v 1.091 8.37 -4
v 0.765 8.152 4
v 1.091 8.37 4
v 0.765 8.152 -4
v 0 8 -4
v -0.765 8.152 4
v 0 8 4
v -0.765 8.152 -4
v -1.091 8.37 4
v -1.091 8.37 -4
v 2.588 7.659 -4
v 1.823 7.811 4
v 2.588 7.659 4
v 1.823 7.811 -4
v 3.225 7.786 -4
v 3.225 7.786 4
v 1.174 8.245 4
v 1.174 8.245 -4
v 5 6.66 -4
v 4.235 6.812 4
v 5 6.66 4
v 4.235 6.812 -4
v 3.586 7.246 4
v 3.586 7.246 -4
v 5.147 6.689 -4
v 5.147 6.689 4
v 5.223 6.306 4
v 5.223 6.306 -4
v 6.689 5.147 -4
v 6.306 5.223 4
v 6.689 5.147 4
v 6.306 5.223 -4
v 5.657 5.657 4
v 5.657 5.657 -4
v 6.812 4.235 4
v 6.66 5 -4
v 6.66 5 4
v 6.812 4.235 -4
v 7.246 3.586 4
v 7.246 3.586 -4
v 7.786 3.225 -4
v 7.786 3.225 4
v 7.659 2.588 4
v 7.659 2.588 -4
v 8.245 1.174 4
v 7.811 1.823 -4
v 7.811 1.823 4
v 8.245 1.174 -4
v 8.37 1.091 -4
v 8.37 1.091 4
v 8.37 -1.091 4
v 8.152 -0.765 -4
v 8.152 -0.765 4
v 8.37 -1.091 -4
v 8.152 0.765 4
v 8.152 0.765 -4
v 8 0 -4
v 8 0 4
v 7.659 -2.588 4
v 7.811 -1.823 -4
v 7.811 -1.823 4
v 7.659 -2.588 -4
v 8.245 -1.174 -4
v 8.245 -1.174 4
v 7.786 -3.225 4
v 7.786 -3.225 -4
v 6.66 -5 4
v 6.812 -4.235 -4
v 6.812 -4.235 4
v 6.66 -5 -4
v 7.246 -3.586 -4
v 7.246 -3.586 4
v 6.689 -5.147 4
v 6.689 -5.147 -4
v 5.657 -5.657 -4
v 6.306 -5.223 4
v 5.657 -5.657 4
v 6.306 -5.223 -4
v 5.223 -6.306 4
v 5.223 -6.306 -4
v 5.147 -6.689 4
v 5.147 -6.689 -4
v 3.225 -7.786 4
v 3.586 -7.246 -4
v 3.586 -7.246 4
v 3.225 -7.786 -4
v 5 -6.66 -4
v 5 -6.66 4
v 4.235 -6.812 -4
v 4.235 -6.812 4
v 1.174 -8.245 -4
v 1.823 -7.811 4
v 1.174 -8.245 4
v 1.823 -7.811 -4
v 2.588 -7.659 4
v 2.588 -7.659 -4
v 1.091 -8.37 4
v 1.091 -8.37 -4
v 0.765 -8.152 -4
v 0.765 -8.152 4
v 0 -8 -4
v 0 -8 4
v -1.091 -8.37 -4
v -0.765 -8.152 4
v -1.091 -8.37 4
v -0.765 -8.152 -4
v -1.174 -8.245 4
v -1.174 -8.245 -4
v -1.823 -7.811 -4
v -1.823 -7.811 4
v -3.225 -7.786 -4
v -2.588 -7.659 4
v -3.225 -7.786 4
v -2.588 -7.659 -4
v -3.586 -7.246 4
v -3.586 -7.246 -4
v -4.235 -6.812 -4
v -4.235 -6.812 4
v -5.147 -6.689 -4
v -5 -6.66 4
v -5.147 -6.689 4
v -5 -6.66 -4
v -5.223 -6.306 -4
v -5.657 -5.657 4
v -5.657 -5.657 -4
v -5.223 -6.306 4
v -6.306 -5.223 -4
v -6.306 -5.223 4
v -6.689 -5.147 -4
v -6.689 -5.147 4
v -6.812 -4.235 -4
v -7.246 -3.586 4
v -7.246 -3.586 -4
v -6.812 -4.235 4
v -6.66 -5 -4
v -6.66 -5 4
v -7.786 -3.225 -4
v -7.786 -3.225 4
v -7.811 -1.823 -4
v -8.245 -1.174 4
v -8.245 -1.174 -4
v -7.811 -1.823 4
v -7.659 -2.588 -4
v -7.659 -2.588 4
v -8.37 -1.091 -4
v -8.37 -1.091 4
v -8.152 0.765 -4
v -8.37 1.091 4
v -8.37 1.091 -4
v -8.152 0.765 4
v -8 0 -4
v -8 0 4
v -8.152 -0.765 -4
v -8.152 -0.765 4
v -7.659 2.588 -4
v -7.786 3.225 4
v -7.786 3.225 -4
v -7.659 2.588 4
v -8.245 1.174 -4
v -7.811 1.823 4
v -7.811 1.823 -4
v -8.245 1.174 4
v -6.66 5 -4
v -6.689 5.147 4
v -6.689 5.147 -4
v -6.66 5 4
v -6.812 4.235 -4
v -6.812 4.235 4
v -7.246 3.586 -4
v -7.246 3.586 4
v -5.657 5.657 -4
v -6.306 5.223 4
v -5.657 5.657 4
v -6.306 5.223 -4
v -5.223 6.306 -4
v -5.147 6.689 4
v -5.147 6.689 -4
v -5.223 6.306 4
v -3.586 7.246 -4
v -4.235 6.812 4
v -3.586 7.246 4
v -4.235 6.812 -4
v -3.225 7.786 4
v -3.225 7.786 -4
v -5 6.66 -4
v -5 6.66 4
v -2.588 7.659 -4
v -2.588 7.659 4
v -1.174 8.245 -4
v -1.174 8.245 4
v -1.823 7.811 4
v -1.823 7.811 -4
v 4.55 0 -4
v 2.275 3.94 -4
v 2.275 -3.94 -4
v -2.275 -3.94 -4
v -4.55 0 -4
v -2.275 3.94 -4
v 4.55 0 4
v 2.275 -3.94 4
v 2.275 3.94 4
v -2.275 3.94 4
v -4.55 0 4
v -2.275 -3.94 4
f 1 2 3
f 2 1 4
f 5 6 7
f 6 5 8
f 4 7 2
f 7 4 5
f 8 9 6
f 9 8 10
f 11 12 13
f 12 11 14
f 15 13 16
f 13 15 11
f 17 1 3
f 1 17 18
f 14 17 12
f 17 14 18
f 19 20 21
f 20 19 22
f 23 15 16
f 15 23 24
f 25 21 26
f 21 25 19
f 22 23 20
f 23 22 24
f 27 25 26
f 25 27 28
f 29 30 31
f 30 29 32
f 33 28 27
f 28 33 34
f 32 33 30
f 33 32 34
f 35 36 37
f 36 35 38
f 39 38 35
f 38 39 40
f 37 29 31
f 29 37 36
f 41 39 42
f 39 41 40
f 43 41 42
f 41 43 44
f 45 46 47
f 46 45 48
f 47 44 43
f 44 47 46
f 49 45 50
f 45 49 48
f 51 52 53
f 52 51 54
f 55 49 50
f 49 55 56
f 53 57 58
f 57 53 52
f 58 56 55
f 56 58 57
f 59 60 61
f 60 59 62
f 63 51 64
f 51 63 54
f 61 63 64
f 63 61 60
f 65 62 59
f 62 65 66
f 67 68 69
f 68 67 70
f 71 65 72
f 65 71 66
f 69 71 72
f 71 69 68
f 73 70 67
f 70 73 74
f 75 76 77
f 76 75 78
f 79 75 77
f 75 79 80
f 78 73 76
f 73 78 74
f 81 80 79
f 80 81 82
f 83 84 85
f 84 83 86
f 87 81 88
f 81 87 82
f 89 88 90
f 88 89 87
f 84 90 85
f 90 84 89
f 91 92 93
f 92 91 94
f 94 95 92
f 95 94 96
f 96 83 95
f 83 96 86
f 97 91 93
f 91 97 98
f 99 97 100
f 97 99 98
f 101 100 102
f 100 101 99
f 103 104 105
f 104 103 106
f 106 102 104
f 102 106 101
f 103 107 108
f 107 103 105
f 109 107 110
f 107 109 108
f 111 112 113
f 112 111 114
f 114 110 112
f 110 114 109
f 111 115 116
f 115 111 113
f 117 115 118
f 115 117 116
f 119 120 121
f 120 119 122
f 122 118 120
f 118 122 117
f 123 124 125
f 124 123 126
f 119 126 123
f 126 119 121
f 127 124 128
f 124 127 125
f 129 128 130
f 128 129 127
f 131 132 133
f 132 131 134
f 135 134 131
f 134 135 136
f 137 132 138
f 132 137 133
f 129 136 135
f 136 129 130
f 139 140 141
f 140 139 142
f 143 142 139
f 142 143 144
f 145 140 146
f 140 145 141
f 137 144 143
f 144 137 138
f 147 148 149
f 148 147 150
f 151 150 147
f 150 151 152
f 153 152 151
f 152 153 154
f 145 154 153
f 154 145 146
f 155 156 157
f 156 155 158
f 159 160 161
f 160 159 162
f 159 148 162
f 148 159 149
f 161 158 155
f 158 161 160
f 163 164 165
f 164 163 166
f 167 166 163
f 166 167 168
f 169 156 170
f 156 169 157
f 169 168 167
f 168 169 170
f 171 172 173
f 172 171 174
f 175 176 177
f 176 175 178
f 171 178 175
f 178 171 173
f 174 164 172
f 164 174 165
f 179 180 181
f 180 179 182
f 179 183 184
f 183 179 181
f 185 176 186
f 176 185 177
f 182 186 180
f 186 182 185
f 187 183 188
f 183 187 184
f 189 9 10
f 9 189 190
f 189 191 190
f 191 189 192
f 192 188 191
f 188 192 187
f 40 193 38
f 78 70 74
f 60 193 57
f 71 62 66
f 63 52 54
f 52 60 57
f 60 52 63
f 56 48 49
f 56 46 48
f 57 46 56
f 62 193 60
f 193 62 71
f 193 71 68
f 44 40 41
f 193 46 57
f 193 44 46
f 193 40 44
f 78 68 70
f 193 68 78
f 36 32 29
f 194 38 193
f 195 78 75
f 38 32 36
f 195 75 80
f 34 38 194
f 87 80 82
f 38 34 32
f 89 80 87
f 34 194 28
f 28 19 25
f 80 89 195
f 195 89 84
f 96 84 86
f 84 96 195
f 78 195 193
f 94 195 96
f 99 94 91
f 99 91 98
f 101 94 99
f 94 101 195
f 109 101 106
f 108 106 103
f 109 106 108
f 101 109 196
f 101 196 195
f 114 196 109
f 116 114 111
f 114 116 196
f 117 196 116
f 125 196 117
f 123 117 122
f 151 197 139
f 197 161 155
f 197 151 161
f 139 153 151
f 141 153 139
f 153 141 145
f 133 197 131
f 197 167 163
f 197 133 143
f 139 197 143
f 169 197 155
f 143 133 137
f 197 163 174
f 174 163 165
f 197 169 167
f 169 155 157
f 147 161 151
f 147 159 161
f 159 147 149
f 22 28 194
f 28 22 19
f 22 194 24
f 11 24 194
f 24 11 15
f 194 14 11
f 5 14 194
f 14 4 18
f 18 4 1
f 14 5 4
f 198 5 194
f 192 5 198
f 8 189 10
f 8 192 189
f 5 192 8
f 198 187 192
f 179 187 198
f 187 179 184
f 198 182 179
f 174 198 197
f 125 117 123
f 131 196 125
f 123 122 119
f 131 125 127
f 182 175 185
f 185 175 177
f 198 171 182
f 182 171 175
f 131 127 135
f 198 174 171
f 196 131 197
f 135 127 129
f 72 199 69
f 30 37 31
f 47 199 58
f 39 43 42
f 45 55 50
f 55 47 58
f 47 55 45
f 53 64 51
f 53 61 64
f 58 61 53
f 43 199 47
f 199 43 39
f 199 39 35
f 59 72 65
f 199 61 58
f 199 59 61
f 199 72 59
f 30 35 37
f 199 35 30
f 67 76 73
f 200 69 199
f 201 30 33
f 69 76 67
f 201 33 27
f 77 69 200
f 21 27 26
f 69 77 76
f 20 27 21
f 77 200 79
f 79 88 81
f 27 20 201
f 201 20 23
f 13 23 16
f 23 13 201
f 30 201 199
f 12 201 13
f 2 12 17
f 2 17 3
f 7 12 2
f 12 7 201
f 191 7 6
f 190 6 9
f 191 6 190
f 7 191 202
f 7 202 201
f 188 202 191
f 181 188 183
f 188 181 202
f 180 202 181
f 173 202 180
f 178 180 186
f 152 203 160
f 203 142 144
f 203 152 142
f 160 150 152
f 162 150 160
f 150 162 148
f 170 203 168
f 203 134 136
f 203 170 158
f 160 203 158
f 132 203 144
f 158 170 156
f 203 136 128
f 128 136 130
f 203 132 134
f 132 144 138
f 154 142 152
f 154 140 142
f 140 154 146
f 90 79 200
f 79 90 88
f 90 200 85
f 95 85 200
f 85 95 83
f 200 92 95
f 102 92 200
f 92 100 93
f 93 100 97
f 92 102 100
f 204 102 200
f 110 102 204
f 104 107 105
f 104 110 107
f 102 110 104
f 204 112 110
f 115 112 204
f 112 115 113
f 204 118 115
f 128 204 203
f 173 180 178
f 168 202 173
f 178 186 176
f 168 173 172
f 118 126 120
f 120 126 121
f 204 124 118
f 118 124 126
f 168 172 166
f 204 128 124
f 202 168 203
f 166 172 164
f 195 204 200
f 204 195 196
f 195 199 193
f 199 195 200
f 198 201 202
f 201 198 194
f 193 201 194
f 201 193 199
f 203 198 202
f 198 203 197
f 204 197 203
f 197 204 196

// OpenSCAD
// Diameter of the whole holder
diameter = 20;
// Tooth diameter
tooth_diameter = 4;

module 888_4007(){
	difference(){
		union(){
			cylinder(r=diameter/2,h=8, center=true);
		}
		for ( i = [0 : 15 : 360] ){
			translate([sin(i)*diameter/2,cos(i)*diameter/2,0]) cylinder(r=tooth_diameter/2,h=9, $fn=16, center = true);
		}
		cylinder(d=9.1,h=16,$fn=6, center = true);
	}
}

888_4007();
